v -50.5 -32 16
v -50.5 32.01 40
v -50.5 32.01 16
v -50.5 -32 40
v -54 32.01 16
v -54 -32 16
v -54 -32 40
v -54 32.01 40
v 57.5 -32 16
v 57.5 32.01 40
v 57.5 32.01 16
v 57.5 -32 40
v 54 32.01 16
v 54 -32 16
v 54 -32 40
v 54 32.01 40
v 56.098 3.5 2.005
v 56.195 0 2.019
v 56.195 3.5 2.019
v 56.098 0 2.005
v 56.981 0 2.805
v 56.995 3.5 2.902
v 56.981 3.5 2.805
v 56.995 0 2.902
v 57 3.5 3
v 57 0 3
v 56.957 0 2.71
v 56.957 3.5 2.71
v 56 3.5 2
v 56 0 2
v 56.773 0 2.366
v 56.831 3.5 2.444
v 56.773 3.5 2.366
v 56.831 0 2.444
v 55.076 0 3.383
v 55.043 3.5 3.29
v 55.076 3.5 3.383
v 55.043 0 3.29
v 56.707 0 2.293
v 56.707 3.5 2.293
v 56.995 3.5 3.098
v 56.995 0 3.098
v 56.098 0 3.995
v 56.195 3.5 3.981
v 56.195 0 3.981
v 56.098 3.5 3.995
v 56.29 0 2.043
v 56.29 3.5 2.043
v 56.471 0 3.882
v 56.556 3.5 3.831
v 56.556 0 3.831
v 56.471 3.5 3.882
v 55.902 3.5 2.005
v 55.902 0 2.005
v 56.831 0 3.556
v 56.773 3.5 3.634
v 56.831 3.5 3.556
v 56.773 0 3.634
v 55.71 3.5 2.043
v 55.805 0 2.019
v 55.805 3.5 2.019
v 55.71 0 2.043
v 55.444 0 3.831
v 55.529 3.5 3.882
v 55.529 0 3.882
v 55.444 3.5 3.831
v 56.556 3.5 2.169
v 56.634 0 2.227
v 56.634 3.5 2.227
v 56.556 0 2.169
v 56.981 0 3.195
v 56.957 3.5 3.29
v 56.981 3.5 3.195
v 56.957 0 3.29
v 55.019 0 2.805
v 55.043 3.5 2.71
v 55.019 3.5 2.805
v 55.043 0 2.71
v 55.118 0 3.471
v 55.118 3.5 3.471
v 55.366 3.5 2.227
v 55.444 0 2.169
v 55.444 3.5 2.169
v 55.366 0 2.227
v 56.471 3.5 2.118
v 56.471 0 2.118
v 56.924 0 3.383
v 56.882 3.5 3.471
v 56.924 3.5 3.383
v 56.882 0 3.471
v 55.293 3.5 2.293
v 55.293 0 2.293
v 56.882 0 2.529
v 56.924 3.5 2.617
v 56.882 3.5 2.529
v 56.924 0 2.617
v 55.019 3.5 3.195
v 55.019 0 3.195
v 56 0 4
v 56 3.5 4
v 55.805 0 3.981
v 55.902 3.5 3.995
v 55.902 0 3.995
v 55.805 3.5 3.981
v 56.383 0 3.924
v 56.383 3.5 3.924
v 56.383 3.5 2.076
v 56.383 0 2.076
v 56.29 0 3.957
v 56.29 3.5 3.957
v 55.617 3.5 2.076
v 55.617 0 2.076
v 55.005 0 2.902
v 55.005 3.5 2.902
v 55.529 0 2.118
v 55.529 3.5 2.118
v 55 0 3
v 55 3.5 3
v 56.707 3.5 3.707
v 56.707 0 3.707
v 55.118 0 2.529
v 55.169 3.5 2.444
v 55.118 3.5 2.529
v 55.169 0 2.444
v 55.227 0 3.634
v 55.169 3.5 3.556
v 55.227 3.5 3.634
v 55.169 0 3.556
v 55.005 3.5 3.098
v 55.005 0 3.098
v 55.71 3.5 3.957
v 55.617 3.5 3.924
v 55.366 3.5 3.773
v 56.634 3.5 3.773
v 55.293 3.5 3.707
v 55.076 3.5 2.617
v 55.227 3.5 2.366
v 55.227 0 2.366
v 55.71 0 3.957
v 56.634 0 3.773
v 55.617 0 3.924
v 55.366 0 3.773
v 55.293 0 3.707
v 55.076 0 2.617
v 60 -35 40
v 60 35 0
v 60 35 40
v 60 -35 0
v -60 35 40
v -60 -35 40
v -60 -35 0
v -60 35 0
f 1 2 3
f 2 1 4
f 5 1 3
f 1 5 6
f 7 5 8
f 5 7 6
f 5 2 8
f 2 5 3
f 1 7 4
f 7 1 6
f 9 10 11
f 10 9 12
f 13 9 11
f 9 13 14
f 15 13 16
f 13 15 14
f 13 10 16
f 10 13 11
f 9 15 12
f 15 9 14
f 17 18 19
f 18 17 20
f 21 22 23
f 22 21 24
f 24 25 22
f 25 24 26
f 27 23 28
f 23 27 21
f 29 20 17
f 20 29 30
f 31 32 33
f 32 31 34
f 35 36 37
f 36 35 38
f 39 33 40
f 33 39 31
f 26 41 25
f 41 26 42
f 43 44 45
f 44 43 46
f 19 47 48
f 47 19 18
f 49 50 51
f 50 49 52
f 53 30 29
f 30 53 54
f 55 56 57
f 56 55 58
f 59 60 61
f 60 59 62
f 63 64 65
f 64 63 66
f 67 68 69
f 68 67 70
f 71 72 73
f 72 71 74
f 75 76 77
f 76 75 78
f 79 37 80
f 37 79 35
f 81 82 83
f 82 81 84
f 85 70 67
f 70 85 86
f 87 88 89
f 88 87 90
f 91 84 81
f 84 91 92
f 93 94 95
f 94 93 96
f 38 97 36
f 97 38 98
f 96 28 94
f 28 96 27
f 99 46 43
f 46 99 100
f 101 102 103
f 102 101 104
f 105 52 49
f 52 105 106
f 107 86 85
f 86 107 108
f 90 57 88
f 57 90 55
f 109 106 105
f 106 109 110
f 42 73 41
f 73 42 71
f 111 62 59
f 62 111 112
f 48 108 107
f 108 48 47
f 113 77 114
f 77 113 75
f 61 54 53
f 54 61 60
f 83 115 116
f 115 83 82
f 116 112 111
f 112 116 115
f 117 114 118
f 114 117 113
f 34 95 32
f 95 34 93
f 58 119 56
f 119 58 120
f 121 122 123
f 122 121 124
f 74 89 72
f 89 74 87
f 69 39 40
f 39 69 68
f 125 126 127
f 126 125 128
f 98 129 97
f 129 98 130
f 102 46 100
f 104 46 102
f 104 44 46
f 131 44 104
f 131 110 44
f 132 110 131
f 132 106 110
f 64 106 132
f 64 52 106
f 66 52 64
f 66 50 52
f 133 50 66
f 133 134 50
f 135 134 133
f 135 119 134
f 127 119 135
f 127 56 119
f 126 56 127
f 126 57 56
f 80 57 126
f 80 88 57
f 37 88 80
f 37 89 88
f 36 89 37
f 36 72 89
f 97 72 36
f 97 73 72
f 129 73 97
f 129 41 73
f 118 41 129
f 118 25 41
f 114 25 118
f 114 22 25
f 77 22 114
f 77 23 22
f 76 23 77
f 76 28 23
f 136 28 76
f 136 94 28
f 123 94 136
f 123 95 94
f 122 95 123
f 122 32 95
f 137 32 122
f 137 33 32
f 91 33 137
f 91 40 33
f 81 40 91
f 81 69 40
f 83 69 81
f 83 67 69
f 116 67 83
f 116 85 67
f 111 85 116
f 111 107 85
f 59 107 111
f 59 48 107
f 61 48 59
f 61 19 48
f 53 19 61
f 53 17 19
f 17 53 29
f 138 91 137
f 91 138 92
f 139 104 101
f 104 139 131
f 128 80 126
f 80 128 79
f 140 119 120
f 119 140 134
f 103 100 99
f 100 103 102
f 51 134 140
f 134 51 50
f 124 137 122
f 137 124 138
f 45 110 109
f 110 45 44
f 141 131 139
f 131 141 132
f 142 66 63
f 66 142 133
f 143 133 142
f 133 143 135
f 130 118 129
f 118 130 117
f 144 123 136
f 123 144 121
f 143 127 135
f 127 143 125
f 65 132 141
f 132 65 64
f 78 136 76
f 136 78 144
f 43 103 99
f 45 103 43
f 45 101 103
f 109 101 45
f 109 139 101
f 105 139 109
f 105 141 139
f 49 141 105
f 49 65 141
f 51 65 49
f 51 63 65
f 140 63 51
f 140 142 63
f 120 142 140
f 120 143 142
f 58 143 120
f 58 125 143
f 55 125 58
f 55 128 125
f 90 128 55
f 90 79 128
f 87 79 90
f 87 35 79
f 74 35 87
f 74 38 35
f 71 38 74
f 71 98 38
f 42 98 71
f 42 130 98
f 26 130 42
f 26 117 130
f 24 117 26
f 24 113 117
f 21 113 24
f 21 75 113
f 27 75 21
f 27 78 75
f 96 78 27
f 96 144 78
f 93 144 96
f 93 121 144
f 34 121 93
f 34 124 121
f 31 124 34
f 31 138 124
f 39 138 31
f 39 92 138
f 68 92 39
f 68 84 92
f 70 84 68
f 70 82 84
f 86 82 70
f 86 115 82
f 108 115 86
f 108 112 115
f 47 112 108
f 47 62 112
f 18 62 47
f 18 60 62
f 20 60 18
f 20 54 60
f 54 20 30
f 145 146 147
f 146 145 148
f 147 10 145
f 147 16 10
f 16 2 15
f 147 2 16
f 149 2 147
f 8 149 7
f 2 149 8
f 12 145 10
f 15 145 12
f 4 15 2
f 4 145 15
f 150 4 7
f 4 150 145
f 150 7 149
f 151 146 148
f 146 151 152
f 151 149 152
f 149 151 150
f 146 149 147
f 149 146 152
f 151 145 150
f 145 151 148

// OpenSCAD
// Buffer tank for mini horizontal gel-electrophoresis box
// Units: mm. Tank rests on XY plane (z = 0), builds upward.

$fn = 64;

// ---- Tank ----
tank_x      = 120;   // outer length (X)
tank_y      = 70;    // outer width (Y)
tank_h      = 40;    // outer height (Z)
wall        = 3;     // wall thickness
floor_t     = 3;     // floor thickness

// ---- Gel-tray platform ----
plat_x      = 60;    // platform length in X (centred)
plat_top_z  = 13;    // platform top height above inner floor (z = 13)

// ---- Electrode holes ----
hole_d      = 2;     // electrode hole diameter
hole_y      = 0;     // electrode hole Y position
hole_w_z    = tank_h - floor_t; // hole length along Z (through wall)

// ---- Misc ----
eps         = 0.5;   // cutter overshoot past faces

// ---- Derived ----
inner_x = tank_x - 2 * wall;          // 114
inner_y = tank_y - 2 * wall;          // 64
inner_f_top = floor_t + plat_top_z;   // 16 (inner floor level to platform top)

difference() {
    // Main tank body
    translate([-tank_x/2, -tank_y/2, 0])
        cube([tank_x, tank_y, tank_h]);

    // Two end blocks that form the walls above the inner floor,
    // leaving the buffer chambers open until the platform top.
    for (sx = [-1, 1])
        translate([sx * (inner_x/2 - wall), -inner_y/2, inner_f_top])
            cube([wall + eps, inner_y + 0.01, tank_h - floor_t]);

    // Horizontal electrode holes through each end wall (along X)
    for (z = [floor_t, tank_h - wall])
        translate([inner_x/2 - 1, hole_y, z])
            rotate([-90, 0, 0])
                cylinder(d = hole_d, h = wall + eps);
}
